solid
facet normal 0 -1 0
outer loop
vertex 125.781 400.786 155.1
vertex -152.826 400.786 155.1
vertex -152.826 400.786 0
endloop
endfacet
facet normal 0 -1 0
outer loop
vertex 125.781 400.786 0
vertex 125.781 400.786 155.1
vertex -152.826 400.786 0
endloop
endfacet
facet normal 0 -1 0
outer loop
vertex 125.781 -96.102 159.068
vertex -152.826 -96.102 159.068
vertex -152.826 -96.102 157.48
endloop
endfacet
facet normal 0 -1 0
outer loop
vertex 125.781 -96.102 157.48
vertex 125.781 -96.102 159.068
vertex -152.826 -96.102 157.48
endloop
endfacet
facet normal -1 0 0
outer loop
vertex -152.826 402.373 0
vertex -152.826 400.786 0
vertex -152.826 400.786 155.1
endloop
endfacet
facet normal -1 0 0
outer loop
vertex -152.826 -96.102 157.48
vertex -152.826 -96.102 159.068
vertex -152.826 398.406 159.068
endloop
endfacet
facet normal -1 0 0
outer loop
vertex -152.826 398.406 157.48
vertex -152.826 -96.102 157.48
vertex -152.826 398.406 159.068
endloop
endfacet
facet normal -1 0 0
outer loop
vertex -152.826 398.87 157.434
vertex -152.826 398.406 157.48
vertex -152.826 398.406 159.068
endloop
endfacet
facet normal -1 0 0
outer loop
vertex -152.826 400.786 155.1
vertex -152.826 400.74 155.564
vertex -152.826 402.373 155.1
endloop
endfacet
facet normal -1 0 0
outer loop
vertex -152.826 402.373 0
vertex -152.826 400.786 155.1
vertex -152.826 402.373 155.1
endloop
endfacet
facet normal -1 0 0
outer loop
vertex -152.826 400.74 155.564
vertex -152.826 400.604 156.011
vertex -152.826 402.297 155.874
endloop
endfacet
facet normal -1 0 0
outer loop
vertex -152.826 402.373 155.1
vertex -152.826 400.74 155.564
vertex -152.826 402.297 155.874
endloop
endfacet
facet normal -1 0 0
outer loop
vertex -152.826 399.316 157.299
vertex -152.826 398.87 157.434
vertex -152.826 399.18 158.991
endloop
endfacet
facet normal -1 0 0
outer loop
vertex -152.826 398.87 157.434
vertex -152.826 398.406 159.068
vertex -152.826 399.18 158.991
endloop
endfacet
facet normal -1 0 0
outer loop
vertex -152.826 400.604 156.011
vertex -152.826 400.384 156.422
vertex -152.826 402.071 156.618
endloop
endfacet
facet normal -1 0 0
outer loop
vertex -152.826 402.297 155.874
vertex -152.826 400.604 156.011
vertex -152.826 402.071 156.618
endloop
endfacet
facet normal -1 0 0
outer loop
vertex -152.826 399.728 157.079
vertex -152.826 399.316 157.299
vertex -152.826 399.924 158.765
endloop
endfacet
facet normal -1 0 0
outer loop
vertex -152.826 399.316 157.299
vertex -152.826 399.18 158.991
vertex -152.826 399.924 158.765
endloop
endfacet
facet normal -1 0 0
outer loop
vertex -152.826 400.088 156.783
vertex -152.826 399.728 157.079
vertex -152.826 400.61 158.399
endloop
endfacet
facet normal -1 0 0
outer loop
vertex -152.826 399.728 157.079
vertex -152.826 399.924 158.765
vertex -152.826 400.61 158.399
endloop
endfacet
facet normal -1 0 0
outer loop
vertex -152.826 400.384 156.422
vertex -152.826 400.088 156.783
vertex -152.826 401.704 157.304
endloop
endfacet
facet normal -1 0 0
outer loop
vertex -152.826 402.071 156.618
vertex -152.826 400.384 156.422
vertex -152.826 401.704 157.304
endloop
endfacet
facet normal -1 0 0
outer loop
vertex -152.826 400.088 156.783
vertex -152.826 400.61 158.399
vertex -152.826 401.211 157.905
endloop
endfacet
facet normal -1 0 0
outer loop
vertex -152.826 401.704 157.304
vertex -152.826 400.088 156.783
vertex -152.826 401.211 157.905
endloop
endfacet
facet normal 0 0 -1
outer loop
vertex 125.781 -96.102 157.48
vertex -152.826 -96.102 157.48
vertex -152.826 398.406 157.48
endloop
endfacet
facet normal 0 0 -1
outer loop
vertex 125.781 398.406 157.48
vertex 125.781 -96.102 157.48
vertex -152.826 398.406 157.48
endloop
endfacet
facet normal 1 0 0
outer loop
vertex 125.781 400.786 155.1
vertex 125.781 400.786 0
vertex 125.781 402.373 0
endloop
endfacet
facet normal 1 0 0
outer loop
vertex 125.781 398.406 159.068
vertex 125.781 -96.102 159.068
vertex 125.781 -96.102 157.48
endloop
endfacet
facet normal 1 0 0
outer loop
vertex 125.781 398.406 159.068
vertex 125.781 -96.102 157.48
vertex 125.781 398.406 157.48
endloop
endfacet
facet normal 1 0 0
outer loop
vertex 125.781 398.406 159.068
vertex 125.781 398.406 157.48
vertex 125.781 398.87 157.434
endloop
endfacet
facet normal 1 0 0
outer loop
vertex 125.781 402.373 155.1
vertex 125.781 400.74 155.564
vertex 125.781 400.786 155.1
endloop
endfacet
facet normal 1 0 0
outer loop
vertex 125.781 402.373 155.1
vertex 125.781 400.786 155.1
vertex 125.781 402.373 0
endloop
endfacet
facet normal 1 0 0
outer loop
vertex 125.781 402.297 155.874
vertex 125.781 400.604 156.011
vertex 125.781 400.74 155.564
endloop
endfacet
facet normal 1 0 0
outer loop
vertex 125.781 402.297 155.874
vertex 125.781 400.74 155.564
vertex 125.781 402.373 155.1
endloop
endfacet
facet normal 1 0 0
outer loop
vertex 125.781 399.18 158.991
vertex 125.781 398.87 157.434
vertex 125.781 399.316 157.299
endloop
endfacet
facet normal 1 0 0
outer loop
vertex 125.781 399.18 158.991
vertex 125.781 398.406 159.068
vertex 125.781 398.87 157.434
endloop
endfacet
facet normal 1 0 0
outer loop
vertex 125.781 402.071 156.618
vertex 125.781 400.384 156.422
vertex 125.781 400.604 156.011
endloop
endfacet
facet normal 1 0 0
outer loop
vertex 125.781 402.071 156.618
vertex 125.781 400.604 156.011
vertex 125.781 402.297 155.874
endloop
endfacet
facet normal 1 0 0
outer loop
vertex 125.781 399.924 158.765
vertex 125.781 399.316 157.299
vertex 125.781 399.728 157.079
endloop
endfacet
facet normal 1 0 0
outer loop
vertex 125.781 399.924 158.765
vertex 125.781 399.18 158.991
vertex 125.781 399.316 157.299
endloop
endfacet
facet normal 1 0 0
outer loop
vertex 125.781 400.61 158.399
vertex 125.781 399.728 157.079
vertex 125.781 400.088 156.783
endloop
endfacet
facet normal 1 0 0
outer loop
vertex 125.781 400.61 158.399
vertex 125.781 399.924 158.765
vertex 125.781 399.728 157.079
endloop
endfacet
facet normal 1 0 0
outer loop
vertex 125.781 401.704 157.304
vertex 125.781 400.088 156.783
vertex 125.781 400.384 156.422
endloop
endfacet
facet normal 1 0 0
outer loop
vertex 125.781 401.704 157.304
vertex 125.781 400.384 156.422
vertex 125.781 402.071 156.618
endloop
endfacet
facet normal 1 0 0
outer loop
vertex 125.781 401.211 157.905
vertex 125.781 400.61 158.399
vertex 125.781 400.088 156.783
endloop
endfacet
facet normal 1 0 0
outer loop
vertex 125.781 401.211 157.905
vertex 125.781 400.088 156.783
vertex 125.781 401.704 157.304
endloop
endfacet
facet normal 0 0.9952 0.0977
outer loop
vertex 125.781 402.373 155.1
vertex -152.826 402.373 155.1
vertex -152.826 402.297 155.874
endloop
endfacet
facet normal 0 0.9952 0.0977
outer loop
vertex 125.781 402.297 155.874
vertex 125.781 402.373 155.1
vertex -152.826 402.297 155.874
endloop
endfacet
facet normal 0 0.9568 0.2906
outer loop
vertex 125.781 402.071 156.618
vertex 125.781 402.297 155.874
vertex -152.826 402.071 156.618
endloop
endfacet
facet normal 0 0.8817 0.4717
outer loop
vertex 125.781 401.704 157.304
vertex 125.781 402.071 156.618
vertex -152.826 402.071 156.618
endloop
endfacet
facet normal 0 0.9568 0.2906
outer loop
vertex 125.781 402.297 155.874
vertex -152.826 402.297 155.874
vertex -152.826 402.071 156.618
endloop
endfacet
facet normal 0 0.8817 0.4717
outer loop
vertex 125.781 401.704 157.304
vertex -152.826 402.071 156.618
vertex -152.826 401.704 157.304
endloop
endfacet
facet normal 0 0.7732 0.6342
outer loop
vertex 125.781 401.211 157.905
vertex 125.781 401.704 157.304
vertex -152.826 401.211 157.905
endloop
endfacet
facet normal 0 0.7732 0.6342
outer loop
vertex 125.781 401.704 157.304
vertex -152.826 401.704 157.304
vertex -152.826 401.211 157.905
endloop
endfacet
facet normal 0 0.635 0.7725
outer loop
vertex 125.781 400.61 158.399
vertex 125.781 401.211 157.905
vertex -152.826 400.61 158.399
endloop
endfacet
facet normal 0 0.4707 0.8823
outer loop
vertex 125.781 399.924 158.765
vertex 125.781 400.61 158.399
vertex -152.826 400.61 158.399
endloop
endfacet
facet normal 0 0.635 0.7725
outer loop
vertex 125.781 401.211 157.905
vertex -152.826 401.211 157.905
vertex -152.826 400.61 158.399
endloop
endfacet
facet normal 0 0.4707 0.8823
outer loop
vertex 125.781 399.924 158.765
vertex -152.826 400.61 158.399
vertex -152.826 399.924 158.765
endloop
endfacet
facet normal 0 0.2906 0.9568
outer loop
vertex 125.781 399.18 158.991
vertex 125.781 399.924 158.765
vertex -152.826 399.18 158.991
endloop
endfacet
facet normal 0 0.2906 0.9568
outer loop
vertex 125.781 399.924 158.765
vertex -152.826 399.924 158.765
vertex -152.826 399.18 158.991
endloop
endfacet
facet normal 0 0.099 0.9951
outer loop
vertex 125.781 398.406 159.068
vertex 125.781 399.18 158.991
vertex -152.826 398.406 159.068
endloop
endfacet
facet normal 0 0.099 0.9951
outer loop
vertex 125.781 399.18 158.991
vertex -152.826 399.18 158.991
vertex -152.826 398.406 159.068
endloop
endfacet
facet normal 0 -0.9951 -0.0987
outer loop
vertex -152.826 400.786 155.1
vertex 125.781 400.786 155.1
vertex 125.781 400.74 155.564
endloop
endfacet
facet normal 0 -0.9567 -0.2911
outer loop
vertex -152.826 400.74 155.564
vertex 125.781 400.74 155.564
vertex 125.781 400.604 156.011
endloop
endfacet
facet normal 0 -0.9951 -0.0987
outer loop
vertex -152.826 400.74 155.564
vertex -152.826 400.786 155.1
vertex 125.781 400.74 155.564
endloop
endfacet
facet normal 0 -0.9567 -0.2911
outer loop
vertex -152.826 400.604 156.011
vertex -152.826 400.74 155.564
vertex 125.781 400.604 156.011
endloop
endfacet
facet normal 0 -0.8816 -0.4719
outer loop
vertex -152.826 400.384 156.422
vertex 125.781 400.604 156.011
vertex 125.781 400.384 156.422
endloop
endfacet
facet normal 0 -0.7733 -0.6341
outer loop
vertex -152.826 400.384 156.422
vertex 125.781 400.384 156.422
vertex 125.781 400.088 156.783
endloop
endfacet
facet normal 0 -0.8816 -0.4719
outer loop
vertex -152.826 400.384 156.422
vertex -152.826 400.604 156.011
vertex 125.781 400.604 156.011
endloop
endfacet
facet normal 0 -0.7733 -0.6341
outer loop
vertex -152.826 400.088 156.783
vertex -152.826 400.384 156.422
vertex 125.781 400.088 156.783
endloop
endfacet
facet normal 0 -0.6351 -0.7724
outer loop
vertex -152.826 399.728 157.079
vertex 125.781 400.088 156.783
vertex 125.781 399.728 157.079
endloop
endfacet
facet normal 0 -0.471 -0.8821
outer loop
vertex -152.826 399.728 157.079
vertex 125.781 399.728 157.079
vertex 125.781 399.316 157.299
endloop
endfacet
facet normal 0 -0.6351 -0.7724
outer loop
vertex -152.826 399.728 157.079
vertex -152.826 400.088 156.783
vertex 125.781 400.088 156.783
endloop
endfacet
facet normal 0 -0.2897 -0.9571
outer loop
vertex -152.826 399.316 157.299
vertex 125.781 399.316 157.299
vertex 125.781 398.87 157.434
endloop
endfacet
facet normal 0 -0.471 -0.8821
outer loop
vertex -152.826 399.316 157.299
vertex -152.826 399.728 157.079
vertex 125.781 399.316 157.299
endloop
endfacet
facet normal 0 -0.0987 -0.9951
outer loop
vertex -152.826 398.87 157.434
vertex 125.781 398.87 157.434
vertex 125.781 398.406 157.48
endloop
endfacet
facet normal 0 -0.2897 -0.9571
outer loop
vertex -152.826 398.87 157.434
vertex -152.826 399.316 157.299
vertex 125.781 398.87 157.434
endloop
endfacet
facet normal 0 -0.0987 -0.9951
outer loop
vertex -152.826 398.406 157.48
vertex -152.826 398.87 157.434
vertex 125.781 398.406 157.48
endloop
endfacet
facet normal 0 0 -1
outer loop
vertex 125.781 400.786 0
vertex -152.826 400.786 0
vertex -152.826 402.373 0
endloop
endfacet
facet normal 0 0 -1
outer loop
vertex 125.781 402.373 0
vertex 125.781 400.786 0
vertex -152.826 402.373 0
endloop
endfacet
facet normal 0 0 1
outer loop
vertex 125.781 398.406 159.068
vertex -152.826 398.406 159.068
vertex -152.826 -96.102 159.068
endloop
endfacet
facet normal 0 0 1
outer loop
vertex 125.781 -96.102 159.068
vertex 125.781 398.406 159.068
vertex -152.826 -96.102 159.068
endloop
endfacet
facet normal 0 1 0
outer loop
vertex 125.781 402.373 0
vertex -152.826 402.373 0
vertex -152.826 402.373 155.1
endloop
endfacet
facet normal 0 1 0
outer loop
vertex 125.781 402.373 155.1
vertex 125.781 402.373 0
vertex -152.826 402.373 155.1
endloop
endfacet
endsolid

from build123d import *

# Parameters (mm, degrees)
SKETCH1_W              = 278.607499934
SKETCH1_H              = 496.8875
BOSS_EXTRUDE1_DEPTH    = 157.48
CONVERT_SOLID1_START   = -152.826113143
CONVERT_SOLID1_DEPTH   = 278.607499934
CONVERT_SOLID1_2_DEPTH = 278.607499934


# Read off the part's stored shape, not the designer's step: Convert-Solid1
with BuildPart() as part:
    # Sketch1 → Boss-Extrude1 (new body)
    with BuildSketch(Plane.XY):
        with Locations((-13.522363176, 152.341784507)):
            Rectangle(SKETCH1_W, SKETCH1_H)
    extrude(amount=BOSS_EXTRUDE1_DEPTH)

    # Convert-Solid1 outline → Convert-Solid1 (cut)
    with BuildSketch(Plane.YZ.offset(CONVERT_SOLID1_START)):
        with BuildLine():
            Line((398.405534441, 157.48), (-96.101965493, 157.48))
            Line((-96.101965493, 157.48), (-96.101965493, 0))
            Line((-96.101965493, 0), (400.785534507, 0))
            Line((400.785534507, 0), (400.785534507, 155.099999934))
            ThreePointArc((400.785534507, 155.099999934), (400.088448627, 156.78291412), (398.405534441, 157.48))
        make_face()
    extrude(amount=CONVERT_SOLID1_DEPTH, mode=Mode.SUBTRACT)

    # Convert-Solid1 2 outline → Convert-Solid1 2 (add)
    with BuildSketch(Plane.YZ.offset(CONVERT_SOLID1_START)):
        with BuildLine():
            Line((398.405534441, 159.0675), (-96.101965493, 159.0675))
            Line((-96.101965493, 159.0675), (-96.101965493, 157.48))
            Line((-96.101965493, 157.48), (400.785534507, 157.48))
            Line((400.785534507, 157.48), (400.785534507, 0))
            Line((400.785534507, 0), (402.373034507, 0))
            Line((402.373034507, 0), (402.373034507, 155.099999934))
            ThreePointArc((402.373034507, 155.099999934), (401.210980642, 157.905446136), (398.405534441, 159.0675))
        make_face()
    extrude(amount=CONVERT_SOLID1_2_DEPTH)


solid = part.part
